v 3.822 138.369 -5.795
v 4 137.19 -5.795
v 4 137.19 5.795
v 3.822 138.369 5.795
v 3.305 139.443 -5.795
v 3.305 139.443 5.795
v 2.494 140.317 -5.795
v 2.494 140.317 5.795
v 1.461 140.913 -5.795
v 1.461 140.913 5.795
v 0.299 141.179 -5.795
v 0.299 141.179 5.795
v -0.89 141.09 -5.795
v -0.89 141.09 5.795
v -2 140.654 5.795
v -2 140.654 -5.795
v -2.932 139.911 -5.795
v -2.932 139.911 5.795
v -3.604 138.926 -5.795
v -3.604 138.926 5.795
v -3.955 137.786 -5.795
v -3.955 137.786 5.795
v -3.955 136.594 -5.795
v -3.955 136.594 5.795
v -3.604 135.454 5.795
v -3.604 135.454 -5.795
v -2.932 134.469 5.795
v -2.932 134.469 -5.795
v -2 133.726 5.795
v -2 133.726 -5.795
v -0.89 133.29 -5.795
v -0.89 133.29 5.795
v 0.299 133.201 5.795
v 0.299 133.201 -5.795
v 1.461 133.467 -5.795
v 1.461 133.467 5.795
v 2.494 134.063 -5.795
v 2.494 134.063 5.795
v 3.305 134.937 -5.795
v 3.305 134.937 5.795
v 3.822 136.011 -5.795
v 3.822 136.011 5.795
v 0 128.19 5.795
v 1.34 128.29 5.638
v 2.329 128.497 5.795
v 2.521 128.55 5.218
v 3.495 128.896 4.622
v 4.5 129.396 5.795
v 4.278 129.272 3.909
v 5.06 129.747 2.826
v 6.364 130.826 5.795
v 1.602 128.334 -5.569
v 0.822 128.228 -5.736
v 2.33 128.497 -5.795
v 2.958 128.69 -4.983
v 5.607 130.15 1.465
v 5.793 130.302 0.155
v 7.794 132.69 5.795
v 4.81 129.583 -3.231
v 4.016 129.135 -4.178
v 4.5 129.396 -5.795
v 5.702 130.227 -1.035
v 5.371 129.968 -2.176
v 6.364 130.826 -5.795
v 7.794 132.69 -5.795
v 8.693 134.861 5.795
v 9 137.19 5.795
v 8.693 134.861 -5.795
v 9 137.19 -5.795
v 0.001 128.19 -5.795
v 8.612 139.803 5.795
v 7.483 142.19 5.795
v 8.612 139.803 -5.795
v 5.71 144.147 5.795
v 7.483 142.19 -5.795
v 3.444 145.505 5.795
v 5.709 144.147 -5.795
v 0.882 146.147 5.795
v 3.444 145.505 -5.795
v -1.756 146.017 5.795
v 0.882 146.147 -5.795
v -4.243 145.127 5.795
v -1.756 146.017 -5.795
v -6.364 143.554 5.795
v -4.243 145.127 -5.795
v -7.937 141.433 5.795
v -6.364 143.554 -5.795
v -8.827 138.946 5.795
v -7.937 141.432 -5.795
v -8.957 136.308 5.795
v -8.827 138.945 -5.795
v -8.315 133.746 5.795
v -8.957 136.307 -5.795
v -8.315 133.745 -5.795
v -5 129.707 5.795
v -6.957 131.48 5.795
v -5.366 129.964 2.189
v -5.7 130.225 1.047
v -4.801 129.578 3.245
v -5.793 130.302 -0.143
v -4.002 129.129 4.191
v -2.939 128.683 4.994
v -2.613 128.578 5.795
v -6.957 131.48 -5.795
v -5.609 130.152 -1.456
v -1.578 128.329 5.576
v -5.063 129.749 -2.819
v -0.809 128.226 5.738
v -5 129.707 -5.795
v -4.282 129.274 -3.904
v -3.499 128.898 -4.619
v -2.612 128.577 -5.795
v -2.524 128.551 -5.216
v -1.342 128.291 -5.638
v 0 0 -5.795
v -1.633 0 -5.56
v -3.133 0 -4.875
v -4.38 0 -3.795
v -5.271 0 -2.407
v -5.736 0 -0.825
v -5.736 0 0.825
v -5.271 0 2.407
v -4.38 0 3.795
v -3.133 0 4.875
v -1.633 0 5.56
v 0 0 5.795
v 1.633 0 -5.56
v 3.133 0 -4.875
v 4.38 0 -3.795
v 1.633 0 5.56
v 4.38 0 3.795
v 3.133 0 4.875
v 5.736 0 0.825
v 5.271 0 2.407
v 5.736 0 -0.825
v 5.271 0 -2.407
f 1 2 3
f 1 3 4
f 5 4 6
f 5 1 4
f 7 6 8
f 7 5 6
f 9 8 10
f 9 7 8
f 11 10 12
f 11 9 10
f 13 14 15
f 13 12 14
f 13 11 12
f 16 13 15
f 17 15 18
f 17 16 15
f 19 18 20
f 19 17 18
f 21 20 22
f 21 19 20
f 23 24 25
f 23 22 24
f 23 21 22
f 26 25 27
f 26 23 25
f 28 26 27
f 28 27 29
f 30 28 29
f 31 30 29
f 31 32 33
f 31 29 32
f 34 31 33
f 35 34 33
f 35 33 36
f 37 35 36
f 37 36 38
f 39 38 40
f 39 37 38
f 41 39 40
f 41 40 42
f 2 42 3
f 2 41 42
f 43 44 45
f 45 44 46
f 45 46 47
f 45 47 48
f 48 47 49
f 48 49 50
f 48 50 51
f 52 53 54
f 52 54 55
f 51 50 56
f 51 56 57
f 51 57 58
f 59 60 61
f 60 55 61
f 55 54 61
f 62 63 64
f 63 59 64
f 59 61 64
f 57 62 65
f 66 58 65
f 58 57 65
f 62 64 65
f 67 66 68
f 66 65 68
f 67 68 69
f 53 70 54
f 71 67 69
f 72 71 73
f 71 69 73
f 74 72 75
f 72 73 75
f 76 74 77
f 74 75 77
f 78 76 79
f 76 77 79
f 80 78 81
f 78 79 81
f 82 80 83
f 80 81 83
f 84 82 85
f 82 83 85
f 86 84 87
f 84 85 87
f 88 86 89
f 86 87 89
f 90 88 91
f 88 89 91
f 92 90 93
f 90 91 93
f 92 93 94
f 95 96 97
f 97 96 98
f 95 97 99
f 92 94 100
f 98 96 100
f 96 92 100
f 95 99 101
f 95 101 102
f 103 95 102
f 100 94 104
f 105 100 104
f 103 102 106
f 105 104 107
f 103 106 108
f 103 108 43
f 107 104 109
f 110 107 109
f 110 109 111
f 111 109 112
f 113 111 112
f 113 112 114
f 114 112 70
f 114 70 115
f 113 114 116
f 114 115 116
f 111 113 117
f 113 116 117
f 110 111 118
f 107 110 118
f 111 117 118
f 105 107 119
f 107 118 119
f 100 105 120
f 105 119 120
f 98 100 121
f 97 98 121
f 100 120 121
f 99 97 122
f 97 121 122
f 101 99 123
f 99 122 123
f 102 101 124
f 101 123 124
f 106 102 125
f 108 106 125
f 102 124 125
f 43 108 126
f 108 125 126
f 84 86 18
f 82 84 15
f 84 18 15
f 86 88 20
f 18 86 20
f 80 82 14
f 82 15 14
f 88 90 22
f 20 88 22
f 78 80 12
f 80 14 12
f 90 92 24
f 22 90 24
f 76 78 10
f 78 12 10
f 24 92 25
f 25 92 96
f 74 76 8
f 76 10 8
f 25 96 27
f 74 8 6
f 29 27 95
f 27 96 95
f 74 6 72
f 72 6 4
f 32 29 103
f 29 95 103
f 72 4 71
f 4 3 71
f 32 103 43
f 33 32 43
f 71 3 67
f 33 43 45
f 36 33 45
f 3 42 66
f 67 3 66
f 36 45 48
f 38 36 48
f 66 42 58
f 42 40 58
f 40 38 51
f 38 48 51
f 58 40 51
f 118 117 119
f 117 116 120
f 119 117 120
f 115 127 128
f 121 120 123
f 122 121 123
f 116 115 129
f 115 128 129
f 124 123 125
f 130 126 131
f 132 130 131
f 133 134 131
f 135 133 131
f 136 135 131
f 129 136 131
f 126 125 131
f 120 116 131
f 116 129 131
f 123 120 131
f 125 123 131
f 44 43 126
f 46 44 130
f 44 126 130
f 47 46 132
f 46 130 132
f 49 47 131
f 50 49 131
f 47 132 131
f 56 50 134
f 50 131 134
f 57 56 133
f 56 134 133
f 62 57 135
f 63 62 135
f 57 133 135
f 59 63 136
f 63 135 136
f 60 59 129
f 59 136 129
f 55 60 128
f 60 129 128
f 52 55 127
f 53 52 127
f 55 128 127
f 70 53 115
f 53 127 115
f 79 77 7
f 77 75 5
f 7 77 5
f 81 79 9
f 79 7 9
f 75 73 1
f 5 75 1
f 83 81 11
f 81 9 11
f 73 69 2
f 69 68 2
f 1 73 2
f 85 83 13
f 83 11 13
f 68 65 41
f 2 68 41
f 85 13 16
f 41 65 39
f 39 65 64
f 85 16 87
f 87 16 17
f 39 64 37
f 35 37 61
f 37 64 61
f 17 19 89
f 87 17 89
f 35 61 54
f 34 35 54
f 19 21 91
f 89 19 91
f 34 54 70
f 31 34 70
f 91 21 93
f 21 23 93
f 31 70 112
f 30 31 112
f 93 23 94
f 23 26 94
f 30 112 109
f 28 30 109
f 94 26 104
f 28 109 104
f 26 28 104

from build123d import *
from build123d.topology import SkipClean

# Parameters (mm, degrees)
SKETCH_1_R             = 5.795
EXTRUDE_1_DEPTH        = 132.19
EXTRUDE_1_2_DEPTH      = 6.19
EXTRUDE_1_2_DEPTH_BACK = 6
SKETCH_3_R             = 9
SKETCH_3_R_2           = 4
CUT_EXTRUDE_1_DEPTH    = 169.19
CUT_EXTRUDE_2_DEPTH    = 147.589618092


with BuildPart() as part:
    # 草圖1 → Extrude 1 (new body)
    with BuildSketch(Plane(origin=(0, 0, 0), x_dir=(1, 0, 0), z_dir=(0, 1, 0))):
        with Locations(Location((0, 0, 0), (0, 0, 270))):
            Circle(SKETCH_1_R)
    extrude(amount=EXTRUDE_1_DEPTH)

    # 草圖3 → Extrude 1 2 (add, two sides: drawn at the far end of the back side and taken through both)
    with BuildSketch(Plane.XY.offset(-EXTRUDE_1_2_DEPTH_BACK)):
        with Locations((0, 137.19)):
            Circle(SKETCH_3_R)
        with Locations((0, 137.19)):
            Circle(SKETCH_3_R_2, mode=Mode.SUBTRACT)
    extrude(amount=EXTRUDE_1_2_DEPTH + EXTRUDE_1_2_DEPTH_BACK)

    # 草圖7 → 除料-伸長1 (cut)
    with BuildSketch(Plane.XZ):
        Polygon((0, 5.795), (-10.217691175, 5.795), (-10.217691175, 6.299881628), (9.331279514, 6.299881628), (9.331279514, 5.795), align=None)
    extrude(amount=-CUT_EXTRUDE_1_DEPTH, mode=Mode.SUBTRACT)

    # 草圖8 → 除料-伸長2 (cut, through all)
    with SkipClean():  # the faces are left unmerged after this step: merging them gives an invalid solid
        with BuildSketch(Plane.XZ):
            Polygon((0, -5.795), (-9.78646388, -5.795), (-9.78646388, -6.666737707), (9.307322442, -6.666737707), (9.307322442, -5.795), align=None)
        extrude(amount=-CUT_EXTRUDE_2_DEPTH, mode=Mode.SUBTRACT)


solid = part.part
